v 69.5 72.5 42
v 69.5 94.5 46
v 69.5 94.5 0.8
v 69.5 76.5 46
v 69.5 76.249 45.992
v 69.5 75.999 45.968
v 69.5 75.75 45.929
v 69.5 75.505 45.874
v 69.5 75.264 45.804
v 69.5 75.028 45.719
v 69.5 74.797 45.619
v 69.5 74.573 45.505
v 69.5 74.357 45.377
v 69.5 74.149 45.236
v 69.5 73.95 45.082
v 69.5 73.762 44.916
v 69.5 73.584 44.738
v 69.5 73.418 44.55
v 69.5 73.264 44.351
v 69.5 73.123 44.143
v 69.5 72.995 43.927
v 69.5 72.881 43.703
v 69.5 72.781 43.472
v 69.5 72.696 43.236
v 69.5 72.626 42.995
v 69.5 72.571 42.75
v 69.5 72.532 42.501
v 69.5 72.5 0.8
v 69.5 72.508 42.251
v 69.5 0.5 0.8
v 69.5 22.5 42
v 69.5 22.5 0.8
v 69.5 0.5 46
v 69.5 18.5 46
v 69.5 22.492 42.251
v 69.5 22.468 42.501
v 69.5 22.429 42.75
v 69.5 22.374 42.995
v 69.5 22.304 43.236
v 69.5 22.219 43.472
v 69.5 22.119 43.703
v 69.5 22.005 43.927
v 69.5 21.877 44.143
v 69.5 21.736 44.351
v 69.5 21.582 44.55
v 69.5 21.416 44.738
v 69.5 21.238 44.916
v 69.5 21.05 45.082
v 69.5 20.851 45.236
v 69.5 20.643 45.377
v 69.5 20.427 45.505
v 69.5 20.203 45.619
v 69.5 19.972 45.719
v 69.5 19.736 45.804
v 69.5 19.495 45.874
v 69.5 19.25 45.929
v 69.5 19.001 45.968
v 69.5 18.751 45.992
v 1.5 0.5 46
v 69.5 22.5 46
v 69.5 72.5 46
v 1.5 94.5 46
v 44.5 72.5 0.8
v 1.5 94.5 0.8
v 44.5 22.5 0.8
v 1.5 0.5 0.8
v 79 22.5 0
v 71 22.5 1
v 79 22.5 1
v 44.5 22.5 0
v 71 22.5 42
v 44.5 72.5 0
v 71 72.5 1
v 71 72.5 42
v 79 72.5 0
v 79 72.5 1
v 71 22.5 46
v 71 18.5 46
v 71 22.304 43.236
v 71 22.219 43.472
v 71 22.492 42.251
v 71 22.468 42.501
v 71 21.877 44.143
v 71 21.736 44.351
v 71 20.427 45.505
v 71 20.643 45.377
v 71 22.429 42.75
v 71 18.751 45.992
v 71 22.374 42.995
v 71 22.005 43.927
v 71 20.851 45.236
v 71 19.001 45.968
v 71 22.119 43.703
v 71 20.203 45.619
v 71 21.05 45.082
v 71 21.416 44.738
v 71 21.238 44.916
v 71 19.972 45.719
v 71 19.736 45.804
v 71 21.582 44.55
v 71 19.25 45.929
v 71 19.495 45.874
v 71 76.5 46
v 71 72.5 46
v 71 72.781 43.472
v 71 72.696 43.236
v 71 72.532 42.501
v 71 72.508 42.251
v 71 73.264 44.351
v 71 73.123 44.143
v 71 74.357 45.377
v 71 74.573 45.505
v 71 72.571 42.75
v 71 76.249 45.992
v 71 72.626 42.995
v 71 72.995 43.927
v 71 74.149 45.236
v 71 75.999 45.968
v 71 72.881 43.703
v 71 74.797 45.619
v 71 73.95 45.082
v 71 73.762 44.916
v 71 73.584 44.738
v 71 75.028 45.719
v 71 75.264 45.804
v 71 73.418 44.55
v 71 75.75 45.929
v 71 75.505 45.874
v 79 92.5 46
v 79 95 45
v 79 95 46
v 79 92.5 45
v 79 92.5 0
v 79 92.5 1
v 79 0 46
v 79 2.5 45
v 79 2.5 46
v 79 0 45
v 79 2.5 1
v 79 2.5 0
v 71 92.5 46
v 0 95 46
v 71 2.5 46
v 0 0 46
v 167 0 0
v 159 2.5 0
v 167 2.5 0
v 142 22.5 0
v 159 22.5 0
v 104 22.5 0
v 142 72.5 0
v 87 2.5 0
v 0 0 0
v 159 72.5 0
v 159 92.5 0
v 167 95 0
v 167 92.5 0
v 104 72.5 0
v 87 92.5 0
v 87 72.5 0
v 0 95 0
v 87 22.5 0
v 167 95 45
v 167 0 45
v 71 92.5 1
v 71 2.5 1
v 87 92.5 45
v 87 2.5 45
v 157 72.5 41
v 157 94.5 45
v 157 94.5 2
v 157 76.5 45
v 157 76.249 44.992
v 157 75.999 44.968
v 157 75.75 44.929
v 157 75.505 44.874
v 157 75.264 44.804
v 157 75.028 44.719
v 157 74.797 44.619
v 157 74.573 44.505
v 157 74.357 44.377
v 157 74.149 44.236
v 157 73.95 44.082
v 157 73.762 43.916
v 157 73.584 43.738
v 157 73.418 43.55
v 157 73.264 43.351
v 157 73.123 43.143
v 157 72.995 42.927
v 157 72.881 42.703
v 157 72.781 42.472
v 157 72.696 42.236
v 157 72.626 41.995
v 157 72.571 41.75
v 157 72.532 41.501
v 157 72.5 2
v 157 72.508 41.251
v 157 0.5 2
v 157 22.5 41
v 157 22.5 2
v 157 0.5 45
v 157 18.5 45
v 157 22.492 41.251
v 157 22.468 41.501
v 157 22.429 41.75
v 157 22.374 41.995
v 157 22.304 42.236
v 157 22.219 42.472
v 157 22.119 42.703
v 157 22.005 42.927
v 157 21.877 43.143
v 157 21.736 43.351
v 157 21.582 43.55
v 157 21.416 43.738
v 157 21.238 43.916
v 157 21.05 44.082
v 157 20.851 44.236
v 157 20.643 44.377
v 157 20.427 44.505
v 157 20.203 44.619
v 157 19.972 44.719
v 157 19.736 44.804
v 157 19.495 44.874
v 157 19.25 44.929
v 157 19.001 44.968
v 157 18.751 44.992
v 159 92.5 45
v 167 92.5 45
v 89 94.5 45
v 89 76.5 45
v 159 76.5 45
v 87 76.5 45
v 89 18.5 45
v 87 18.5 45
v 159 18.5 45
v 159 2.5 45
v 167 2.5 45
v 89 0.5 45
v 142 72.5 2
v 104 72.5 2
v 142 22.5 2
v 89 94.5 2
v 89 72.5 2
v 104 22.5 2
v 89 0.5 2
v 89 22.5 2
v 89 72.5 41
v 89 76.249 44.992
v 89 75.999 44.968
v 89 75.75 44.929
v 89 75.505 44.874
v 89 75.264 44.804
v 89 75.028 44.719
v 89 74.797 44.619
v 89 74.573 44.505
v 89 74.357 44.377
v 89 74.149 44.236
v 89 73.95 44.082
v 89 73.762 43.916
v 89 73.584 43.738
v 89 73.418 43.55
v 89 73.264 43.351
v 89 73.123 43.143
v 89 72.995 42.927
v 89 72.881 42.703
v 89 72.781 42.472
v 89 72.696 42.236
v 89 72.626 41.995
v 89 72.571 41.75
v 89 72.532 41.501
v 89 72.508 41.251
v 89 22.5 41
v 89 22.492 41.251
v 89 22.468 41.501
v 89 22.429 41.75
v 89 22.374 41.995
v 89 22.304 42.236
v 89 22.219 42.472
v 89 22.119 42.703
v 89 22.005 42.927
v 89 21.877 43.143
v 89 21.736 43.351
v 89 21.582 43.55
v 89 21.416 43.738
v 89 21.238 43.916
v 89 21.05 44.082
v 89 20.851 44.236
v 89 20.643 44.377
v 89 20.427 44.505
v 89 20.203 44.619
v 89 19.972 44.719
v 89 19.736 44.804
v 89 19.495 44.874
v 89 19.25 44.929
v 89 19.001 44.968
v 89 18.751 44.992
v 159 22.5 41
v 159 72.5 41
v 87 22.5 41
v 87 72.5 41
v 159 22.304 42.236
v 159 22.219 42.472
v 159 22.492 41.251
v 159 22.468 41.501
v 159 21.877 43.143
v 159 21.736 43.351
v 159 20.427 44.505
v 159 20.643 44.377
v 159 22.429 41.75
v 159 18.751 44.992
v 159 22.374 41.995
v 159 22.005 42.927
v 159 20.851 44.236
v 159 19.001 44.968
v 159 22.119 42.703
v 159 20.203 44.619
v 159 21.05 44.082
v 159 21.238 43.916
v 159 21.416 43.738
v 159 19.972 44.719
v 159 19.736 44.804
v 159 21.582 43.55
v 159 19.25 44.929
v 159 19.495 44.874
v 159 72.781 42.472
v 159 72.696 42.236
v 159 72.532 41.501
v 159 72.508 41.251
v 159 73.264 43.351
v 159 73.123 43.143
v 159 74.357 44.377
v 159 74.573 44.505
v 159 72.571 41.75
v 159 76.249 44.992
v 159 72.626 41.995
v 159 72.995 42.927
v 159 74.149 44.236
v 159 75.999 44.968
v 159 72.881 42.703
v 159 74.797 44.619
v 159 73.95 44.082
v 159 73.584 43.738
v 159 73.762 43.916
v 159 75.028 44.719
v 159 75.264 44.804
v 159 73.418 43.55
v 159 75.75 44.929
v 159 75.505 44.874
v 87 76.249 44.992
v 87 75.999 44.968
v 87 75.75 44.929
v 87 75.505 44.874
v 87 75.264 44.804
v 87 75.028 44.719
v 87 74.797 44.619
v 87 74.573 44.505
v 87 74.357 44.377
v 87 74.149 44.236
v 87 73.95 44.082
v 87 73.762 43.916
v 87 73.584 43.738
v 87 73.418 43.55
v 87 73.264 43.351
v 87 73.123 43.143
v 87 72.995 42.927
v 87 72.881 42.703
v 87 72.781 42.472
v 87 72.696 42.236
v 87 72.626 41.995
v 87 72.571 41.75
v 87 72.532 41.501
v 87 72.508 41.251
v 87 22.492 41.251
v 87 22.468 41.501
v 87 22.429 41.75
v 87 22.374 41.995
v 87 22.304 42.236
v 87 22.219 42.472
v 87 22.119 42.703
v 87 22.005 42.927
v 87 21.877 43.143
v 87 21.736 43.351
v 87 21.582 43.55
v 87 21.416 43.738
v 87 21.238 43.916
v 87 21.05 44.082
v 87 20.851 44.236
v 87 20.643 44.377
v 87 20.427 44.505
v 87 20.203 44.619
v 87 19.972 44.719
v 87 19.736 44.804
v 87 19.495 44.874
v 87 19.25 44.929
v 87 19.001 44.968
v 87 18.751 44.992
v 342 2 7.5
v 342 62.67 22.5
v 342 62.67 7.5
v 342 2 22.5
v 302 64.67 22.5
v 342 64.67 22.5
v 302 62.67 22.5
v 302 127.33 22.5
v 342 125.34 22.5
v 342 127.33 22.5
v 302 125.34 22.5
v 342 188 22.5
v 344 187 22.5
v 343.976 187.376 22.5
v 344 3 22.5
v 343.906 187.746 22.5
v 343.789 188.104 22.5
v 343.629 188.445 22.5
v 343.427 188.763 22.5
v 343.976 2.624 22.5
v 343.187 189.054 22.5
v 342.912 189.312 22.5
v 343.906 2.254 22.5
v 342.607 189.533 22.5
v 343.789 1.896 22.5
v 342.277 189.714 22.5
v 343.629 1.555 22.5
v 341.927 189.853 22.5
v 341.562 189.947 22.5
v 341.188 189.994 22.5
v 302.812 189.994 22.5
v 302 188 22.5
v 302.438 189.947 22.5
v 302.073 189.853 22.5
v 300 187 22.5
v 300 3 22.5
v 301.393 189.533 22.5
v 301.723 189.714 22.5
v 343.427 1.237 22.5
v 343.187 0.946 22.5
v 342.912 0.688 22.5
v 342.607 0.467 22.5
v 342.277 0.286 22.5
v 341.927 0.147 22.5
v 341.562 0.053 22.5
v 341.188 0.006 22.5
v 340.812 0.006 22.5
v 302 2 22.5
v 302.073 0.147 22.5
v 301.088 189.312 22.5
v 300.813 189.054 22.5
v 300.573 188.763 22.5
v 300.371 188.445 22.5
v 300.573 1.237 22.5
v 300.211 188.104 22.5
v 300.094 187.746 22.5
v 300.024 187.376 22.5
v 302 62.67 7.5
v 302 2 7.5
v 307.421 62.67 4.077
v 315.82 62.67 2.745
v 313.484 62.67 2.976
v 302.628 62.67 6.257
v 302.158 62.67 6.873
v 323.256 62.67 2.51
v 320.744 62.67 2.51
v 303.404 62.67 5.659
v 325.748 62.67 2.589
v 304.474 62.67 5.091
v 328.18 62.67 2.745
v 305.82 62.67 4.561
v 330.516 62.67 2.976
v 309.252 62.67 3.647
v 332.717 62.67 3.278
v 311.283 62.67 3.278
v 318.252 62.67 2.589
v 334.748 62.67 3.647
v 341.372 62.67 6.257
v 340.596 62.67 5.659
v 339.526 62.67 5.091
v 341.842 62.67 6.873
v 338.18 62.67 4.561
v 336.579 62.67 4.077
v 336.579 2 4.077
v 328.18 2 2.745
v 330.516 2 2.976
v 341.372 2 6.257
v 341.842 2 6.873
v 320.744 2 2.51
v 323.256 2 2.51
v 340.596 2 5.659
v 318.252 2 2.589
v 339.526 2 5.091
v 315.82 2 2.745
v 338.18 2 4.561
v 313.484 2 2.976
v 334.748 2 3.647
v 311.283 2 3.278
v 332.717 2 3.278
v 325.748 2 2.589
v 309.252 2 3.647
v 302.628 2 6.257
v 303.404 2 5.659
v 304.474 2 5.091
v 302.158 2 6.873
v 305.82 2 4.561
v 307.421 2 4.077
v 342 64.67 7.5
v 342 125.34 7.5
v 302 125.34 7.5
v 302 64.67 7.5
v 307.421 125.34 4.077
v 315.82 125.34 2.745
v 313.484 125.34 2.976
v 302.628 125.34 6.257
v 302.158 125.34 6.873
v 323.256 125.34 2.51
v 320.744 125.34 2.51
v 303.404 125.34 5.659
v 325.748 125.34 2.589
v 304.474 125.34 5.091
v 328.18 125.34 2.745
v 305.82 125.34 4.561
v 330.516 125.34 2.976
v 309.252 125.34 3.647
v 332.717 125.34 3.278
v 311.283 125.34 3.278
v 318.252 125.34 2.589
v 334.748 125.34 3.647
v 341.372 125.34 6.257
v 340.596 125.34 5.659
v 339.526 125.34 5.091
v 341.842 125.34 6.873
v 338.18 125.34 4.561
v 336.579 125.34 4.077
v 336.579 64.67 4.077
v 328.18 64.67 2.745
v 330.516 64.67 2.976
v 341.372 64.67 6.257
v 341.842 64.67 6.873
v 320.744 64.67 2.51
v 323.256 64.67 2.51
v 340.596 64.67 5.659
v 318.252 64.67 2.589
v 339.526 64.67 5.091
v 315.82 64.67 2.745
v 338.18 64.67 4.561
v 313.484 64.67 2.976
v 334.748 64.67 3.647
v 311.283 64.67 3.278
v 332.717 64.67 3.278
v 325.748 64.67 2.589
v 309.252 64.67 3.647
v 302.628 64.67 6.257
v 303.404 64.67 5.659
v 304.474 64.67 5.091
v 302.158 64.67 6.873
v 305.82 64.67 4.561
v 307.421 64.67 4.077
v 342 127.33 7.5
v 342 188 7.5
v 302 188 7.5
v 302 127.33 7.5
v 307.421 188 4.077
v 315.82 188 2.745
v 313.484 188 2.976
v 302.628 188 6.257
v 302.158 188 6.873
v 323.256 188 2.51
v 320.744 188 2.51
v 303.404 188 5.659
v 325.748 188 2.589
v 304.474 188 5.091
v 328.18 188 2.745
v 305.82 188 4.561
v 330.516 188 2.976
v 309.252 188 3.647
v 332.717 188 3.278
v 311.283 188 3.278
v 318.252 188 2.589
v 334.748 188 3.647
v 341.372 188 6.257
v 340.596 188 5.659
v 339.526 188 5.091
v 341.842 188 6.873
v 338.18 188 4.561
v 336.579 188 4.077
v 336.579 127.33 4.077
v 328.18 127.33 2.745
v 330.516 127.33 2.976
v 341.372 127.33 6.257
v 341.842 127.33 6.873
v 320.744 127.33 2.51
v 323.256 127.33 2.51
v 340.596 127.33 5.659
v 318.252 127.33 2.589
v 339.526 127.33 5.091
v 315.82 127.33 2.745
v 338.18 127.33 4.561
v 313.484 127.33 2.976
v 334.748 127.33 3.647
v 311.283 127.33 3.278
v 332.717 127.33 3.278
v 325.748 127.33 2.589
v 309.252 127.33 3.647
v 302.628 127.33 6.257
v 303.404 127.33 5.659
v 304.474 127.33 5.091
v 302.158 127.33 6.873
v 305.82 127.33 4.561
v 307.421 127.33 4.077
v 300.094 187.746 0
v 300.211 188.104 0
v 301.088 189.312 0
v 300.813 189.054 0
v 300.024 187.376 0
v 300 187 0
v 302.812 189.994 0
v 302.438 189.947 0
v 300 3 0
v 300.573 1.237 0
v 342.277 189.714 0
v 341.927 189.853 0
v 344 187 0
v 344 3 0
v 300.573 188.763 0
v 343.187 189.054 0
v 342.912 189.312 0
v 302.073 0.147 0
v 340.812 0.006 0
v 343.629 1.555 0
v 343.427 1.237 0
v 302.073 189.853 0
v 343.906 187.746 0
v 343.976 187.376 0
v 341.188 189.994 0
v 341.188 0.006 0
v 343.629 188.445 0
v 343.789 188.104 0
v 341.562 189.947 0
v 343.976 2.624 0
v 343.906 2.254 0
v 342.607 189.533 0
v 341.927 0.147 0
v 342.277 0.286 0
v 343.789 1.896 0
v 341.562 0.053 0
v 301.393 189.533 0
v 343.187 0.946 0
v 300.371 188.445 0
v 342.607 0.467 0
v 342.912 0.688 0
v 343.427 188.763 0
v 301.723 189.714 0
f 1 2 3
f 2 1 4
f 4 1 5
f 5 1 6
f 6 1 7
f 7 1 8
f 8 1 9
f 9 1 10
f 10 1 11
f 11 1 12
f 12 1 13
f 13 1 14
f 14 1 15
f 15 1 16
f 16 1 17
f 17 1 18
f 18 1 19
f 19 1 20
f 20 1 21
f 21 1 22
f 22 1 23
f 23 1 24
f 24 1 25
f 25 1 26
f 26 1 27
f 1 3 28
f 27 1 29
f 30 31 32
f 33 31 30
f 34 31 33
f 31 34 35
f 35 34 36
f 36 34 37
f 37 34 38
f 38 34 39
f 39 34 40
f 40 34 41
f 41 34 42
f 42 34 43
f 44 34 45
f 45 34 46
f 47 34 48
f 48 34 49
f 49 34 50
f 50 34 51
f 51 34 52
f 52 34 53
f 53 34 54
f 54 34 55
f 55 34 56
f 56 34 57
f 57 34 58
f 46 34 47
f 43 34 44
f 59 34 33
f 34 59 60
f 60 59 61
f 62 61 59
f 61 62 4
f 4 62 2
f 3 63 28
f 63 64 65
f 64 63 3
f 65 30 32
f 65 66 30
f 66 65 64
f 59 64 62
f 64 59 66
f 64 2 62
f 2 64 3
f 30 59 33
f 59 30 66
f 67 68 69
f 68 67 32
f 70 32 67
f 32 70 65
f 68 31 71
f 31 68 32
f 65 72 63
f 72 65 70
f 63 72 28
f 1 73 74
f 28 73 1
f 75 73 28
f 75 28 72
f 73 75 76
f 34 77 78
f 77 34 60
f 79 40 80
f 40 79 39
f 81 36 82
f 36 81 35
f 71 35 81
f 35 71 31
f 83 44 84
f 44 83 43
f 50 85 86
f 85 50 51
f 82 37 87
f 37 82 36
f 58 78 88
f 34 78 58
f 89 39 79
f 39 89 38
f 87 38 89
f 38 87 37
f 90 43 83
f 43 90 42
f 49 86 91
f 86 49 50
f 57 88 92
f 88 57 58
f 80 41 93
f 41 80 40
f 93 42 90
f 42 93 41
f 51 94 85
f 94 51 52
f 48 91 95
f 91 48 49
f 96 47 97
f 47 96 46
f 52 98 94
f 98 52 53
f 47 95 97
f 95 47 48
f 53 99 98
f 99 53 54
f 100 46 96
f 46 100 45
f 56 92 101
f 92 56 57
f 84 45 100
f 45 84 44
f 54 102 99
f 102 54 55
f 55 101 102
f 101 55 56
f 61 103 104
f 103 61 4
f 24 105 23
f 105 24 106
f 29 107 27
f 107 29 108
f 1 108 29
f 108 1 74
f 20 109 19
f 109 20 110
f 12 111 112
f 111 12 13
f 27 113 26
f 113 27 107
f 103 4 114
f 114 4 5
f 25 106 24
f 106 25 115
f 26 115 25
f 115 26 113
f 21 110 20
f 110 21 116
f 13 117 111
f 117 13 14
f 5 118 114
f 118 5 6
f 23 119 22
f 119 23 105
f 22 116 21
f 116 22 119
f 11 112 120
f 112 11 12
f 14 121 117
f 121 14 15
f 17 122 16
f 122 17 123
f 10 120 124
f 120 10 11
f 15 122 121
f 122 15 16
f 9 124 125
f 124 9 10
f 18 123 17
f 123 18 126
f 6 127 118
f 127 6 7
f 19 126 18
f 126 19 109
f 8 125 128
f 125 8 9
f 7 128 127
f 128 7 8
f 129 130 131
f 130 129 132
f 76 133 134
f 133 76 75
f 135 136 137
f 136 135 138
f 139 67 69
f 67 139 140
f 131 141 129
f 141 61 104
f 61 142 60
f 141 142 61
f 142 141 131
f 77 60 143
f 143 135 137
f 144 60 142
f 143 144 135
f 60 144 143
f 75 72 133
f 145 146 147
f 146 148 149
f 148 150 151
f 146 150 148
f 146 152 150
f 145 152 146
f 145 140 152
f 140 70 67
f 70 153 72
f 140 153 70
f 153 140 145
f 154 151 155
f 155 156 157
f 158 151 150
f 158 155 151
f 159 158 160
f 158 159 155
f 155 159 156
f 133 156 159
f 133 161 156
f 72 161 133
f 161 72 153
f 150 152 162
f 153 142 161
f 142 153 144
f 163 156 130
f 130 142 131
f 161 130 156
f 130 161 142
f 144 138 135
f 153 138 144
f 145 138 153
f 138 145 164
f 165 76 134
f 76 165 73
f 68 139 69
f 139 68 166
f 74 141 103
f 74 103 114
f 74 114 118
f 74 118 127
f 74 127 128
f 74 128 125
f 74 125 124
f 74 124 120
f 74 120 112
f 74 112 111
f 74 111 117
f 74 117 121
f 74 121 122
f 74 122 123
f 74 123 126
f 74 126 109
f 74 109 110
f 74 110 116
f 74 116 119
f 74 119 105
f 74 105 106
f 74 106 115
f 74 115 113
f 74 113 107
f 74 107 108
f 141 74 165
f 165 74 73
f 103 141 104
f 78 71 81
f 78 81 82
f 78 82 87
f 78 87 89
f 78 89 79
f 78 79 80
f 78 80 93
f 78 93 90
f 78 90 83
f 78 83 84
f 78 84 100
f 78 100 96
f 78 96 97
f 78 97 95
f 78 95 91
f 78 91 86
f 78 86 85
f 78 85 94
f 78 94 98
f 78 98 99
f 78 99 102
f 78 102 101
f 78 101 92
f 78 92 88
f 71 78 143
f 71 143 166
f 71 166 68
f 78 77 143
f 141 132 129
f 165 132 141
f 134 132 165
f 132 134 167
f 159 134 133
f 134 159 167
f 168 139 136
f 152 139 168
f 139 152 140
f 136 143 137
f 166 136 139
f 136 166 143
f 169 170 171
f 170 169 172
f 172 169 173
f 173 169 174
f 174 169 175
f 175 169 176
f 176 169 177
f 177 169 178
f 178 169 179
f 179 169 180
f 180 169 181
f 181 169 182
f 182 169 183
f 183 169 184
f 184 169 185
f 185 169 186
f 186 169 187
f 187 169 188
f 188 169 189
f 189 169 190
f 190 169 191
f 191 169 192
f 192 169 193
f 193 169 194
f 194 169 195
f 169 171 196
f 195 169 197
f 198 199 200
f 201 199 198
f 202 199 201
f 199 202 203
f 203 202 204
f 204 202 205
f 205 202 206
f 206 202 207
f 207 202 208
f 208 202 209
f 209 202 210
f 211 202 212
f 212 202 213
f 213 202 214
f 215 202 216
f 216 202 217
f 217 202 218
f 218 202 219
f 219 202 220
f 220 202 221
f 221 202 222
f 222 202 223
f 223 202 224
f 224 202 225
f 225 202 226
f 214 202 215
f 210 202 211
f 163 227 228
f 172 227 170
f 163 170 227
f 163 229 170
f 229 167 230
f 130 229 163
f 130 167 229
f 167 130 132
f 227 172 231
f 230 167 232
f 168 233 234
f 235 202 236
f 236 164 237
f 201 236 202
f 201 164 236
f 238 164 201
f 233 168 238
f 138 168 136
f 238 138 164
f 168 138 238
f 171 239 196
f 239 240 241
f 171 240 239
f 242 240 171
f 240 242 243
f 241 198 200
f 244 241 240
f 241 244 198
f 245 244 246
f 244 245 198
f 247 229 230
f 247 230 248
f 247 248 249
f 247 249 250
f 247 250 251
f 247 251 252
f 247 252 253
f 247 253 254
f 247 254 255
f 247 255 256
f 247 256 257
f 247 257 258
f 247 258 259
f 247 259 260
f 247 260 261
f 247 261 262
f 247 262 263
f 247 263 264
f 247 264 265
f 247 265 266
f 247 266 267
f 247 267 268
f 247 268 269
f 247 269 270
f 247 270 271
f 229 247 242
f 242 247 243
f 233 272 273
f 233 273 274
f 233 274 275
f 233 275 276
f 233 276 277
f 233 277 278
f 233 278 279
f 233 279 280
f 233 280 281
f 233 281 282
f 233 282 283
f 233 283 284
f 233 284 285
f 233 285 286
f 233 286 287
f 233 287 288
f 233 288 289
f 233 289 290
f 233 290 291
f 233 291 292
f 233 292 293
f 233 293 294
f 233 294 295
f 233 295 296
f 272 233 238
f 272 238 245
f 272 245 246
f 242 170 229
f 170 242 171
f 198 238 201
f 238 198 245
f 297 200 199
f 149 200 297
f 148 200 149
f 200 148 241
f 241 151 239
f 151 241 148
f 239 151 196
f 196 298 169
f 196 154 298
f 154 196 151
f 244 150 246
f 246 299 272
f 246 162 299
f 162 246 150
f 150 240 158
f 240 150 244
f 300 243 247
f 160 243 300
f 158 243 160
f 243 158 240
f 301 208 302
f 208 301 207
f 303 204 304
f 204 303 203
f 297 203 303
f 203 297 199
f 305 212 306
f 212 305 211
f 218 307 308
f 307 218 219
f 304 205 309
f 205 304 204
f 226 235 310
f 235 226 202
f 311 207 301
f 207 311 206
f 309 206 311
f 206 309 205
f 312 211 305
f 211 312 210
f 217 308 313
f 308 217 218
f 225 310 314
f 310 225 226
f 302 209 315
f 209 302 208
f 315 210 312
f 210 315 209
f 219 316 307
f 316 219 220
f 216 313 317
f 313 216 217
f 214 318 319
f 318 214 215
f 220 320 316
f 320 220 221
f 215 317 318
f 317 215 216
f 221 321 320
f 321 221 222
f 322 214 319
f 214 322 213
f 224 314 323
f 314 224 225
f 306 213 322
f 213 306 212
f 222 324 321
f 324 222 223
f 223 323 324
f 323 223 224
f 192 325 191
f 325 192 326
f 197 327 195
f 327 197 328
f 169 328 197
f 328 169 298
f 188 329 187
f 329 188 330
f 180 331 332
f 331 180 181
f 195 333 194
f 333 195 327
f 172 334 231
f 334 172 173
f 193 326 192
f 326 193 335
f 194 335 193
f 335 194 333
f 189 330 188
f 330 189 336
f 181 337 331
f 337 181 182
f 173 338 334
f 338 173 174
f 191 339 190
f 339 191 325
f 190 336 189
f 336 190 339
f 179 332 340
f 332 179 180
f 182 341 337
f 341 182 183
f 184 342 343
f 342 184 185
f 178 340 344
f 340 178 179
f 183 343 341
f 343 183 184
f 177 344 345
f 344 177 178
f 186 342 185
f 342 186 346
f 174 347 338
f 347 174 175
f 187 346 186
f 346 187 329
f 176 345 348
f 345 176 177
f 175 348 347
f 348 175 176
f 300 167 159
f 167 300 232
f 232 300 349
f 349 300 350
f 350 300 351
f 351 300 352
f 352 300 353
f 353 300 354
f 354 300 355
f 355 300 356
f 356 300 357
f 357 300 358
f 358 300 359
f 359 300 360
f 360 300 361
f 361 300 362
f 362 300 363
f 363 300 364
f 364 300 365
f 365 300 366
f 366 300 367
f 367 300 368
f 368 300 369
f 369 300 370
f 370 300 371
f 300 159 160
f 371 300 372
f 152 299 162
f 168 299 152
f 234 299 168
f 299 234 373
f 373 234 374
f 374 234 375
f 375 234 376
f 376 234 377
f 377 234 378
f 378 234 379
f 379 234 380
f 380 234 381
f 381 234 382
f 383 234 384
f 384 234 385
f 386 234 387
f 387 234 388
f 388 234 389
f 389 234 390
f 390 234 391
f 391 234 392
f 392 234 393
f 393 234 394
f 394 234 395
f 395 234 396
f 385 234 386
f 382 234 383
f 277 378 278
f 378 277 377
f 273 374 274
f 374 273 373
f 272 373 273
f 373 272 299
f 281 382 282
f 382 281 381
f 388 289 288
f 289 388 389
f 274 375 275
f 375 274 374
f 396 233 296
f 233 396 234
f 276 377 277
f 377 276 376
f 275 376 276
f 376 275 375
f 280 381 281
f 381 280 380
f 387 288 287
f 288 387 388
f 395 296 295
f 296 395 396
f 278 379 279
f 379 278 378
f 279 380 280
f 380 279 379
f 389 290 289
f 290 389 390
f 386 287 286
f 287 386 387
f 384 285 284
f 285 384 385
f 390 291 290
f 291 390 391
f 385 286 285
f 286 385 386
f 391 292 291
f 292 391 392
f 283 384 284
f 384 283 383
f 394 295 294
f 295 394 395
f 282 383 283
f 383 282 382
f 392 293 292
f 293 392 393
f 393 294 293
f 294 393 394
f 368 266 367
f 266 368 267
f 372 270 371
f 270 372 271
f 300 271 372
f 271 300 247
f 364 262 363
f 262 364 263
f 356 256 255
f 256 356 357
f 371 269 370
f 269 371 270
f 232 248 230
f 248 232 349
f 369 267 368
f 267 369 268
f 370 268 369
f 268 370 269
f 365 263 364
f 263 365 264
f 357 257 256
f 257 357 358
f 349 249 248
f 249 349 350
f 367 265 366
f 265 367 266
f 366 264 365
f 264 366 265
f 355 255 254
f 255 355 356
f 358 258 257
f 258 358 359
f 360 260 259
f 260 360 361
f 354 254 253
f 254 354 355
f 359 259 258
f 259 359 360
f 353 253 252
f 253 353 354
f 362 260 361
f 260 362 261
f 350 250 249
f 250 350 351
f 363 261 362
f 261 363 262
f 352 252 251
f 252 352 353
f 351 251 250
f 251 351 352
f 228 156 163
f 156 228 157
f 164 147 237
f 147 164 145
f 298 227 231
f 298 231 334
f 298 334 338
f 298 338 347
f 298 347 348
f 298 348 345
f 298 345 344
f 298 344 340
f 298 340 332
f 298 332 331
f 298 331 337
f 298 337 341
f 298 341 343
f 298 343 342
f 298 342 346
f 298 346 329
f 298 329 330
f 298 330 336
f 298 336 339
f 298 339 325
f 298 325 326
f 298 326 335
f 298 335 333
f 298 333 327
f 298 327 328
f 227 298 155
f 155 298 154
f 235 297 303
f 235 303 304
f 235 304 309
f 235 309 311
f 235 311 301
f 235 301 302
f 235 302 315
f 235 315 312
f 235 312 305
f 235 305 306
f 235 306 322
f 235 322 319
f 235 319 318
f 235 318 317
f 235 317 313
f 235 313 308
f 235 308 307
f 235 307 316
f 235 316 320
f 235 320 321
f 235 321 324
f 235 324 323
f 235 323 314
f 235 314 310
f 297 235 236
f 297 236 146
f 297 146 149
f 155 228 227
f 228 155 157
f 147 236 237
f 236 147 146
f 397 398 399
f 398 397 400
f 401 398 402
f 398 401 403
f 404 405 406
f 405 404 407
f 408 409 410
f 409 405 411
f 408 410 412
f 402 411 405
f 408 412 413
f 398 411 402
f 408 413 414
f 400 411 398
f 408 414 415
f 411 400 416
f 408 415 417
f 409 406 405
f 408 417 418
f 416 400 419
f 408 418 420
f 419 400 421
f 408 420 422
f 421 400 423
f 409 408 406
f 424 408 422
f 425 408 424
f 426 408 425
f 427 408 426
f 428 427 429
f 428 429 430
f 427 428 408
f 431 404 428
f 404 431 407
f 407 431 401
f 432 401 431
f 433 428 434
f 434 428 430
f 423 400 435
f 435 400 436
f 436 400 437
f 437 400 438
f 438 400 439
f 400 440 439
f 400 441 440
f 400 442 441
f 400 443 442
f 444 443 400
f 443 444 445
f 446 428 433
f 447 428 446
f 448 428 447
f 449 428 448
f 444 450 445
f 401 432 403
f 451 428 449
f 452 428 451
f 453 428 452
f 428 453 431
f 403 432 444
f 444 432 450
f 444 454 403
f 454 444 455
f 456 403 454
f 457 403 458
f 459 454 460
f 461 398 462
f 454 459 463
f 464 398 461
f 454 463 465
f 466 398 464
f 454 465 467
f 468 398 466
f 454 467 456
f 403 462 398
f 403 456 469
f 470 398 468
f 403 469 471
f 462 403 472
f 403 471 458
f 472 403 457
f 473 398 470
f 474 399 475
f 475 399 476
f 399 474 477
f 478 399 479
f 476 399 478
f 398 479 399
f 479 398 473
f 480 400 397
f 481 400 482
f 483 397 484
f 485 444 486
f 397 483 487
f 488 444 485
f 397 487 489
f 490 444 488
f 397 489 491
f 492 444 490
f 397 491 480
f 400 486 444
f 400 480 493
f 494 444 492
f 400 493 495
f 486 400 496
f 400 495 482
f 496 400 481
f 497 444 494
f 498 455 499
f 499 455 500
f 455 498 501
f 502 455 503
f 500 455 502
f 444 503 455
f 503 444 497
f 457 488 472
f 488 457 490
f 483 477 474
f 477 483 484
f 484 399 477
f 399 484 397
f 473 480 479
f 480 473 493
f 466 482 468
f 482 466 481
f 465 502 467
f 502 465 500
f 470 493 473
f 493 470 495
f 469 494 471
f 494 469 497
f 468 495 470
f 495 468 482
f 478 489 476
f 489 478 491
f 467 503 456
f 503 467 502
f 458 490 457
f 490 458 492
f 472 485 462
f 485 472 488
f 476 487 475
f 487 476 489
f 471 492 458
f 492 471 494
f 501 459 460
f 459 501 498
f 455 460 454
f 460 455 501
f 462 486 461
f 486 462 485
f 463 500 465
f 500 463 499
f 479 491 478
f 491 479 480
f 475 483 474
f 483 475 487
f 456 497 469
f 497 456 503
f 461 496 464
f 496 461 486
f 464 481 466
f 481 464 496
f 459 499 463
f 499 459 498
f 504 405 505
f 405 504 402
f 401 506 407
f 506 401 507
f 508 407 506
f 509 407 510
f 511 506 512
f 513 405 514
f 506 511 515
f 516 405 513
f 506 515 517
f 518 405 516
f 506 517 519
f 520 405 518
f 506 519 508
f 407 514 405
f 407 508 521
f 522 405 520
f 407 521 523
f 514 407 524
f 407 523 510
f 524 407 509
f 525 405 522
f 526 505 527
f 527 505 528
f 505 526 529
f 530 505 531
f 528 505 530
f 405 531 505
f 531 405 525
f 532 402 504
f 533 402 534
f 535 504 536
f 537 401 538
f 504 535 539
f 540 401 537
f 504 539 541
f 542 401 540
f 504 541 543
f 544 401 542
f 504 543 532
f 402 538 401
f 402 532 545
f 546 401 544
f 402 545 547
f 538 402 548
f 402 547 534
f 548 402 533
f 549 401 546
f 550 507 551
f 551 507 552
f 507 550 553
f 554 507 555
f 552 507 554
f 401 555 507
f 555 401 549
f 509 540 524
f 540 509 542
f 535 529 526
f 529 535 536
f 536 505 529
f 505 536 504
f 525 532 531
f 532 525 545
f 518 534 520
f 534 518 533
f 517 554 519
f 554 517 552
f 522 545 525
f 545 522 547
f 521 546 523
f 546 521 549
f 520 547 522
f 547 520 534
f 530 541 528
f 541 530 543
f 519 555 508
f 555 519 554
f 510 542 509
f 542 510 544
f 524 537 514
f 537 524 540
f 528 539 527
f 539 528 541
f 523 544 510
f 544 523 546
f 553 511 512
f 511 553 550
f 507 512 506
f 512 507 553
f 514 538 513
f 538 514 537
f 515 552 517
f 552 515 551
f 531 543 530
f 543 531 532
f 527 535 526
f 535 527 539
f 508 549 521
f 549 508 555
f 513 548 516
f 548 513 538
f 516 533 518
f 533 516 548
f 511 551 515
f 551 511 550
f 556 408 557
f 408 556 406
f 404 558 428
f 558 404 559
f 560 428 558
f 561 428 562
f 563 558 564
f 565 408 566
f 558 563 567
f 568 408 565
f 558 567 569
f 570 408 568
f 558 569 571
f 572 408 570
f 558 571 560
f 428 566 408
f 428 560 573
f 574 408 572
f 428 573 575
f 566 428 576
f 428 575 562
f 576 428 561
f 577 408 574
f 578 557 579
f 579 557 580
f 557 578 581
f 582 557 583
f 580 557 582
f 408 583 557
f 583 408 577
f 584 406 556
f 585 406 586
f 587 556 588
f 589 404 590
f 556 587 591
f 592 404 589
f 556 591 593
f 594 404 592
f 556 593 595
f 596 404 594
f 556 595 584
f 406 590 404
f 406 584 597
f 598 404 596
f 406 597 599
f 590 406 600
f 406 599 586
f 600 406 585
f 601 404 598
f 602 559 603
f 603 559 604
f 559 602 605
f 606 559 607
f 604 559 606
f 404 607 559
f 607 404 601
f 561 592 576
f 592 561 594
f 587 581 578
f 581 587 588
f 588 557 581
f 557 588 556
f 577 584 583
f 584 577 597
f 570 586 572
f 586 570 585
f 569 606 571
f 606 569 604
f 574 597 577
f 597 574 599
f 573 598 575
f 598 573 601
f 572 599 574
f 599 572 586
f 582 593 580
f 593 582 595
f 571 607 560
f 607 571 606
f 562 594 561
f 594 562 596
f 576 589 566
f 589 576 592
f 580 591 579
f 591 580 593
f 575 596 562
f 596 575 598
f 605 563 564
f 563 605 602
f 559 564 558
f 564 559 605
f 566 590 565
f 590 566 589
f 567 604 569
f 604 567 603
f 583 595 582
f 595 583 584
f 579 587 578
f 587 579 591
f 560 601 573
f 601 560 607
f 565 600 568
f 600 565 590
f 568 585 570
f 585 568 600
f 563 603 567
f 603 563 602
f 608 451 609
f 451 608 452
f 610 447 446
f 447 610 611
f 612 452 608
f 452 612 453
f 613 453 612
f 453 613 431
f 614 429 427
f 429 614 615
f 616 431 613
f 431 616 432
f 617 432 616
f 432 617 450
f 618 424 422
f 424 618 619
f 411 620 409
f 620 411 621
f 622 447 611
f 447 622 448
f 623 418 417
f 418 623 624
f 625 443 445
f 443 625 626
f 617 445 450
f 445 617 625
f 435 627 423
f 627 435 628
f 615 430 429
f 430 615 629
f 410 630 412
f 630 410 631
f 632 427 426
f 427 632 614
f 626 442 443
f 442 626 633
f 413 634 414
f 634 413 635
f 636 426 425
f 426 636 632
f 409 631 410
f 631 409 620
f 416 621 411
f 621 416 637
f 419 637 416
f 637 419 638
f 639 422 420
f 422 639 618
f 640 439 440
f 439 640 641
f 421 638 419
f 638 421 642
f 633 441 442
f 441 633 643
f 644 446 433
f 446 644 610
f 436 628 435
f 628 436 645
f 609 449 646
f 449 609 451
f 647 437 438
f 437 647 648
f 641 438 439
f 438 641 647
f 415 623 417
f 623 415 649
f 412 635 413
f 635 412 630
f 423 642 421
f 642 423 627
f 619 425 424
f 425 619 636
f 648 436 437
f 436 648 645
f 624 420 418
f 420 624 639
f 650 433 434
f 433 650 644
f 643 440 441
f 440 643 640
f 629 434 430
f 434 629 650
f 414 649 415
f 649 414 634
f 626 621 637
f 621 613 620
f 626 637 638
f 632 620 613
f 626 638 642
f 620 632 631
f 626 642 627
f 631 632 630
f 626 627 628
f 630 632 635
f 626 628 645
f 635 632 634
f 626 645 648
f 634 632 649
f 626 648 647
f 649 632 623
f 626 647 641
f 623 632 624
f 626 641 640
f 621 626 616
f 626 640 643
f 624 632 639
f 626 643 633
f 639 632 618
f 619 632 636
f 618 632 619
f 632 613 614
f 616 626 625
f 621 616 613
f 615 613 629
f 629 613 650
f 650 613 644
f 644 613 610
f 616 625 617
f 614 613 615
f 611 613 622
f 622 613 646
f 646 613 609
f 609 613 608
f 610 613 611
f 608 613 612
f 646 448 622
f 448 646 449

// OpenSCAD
// file: Test-2.scad
/*Code Generated using OSCADSharp on 30/05/2025 09:12:49. 

For more information, please visit https://github.com/Exolun/OSCADSharp */

module Render2()
{
    difference()
    {
        translate(v = [3.00, 3.00, 0.00])
        {
            hull()
            {
                cylinder(center = false, r1 = 3, r2 = 3, h = 22.5);
                translate(v = [38.00, 0.00, 0.00])
                {
                    cylinder(center = false, r1 = 3, r2 = 3, h = 22.5, $fn = 50);
                }
                translate(v = [0.00, 184.00, 0.00])
                {
                    cylinder(center = false, r1 = 3, r2 = 3, h = 22.5, $fn = 50);
                }
                translate(v = [38.00, 184.00, 0.00])
                {
                    cylinder(center = false, r1 = 3, r2 = 3, h = 22.5, $fn = 50);
                }
            }
        }
        translate(v = [2.00, 2.00, 2.50])
        {
            union()
            {
                union()
                {
                    translate(v = [0.00, 0.00, 5.00])
                    {
                        cube(size = [40.00, 60.67, 15.00], center = false); 
                    }
                    translate(v = [20.00, 0.00, 5.00])
                    {
                        scale(v = [20.00, 60.67, 5.00])
                        {
                            rotate([-90.00, 0.00, 0.00])
                            {
                                cylinder(center = false, r1 = 1, r2 = 1, h = 1, $fn = 50);
                            }
                        }
                    }
                }
                translate(v = [0.00, 62.67, 0.00])
                {
                    union()
                    {
                        translate(v = [0.00, 0.00, 5.00])
                        {
                            cube(size = [40.00, 60.67, 15.00], center = false); 
                        }
                        translate(v = [20.00, 0.00, 5.00])
                        {
                            scale(v = [20.00, 60.67, 5.00])
                            {
                                rotate([-90.00, 0.00, 0.00])
                                {
                                    cylinder(center = false, r1 = 1, r2 = 1, h = 1, $fn = 50);
                                }
                            }
                        }
                    }
                }
                translate(v = [0.00, 125.33, 0.00])
                {
                    union()
                    {
                        translate(v = [0.00, 0.00, 5.00])
                        {
                            cube(size = [40.00, 60.67, 15.00], center = false); 
                        }
                        translate(v = [20.00, 0.00, 5.00])
                        {
                            scale(v = [20.00, 60.67, 5.00])
                            {
                                rotate([-90.00, 0.00, 0.00])
                                {
                                    cylinder(center = false, r1 = 1, r2 = 1, h = 1, $fn = 50);
                                }
                            }
                        }
                    }
                }
            }
        }
    }
}
// file: Test-1.scad
/*Code Generated using OSCADSharp on 30/05/2025 09:12:49. 

For more information, please visit https://github.com/Exolun/OSCADSharp */

module Render1()
{
    difference()
    {
        cube(size = [88.00, 95.00, 45.00], center = false); 
        translate(v = [10.00, 0.50, 2.00])
        {
            union()
            {
                union()
                {
                    union()
                    {
                        union()
                        {
                            cube(size = [68.00, 94.00, 43.00], center = false); 
                            translate(v = [83.00, 22.00, -10.00])
                            {
                                rotate([0.00, 0.00, 90.00])
                                {
                                    cube(size = [50.00, 30.00, 53.00], center = false); 
                                }
                            }
                        }
                        translate(v = [15.00, 22.00, -10.00])
                        {
                            rotate([0.00, 0.00, 90.00])
                            {
                                cube(size = [50.00, 30.00, 53.00], center = false); 
                            }
                        }
                    }
                    translate(v = [70.00, 18.00, 0.00])
                    {
                        rotate([0.00, 0.00, 90.00])
                        {
                            translate(v = [29.00, 0.00, 25.00])
                            {
                                union()
                                {
                                    hull()
                                    {
                                        rotate([90.00, 0.00, 0.00])
                                        {
                                            cylinder(center = true, r1 = 25, r2 = 25, h = 4);
                                        }
                                        translate(v = [-25.00, -2.00, 0.00])
                                        {
                                            cube(size = [50.00, 4.00, 18.00], center = false); 
                                        }
                                    }
                                    translate(v = [-29.00, -2.00, 14.00])
                                    {
                                        difference()
                                        {
                                            cube(size = [4.00, 4.00, 4.00], center = false); 
                                            translate(v = [0.00, 4.00, 0.00])
                                            {
                                                rotate([90.00, 0.00, 0.00])
                                                {
                                                    cylinder(center = false, r1 = 4, r2 = 4, h = 4, $fn = 100);
                                                }
                                            }
                                        }
                                    }
                                    mirror([50.00, 0.00, 0.00])
                                    {
                                        translate(v = [-29.00, -2.00, 14.00])
                                        {
                                            difference()
                                            {
                                                cube(size = [4.00, 4.00, 4.00], center = false); 
                                                translate(v = [0.00, 4.00, 0.00])
                                                {
                                                    rotate([90.00, 0.00, 0.00])
                                                    {
                                                        cylinder(center = false, r1 = 4, r2 = 4, h = 4, $fn = 100);
                                                    }
                                                }
                                            }
                                        }
                                    }
                                }
                            }
                        }
                    }
                }
                translate(v = [0.00, 18.00, 0.00])
                {
                    rotate([0.00, 0.00, 90.00])
                    {
                        translate(v = [29.00, 0.00, 25.00])
                        {
                            union()
                            {
                                hull()
                                {
                                    rotate([90.00, 0.00, 0.00])
                                    {
                                        cylinder(center = true, r1 = 25, r2 = 25, h = 4);
                                    }
                                    translate(v = [-25.00, -2.00, 0.00])
                                    {
                                        cube(size = [50.00, 4.00, 18.00], center = false); 
                                    }
                                }
                                translate(v = [-29.00, -2.00, 14.00])
                                {
                                    difference()
                                    {
                                        cube(size = [4.00, 4.00, 4.00], center = false); 
                                        translate(v = [0.00, 4.00, 0.00])
                                        {
                                            rotate([90.00, 0.00, 0.00])
                                            {
                                                cylinder(center = false, r1 = 4, r2 = 4, h = 4, $fn = 100);
                                            }
                                        }
                                    }
                                }
                                mirror([50.00, 0.00, 0.00])
                                {
                                    translate(v = [-29.00, -2.00, 14.00])
                                    {
                                        difference()
                                        {
                                            cube(size = [4.00, 4.00, 4.00], center = false); 
                                            translate(v = [0.00, 4.00, 0.00])
                                            {
                                                rotate([90.00, 0.00, 0.00])
                                                {
                                                    cylinder(center = false, r1 = 4, r2 = 4, h = 4, $fn = 100);
                                                }
                                            }
                                        }
                                    }
                                }
                            }
                        }
                    }
                }
            }
        }
        translate(v = [80.00, 2.50, 0.00])
        {
            cube(size = [8.00, 90.00, 45.00], center = false); 
        }
        translate(v = [0.00, 2.50, 0.00])
        {
            cube(size = [8.00, 90.00, 45.00], center = false); 
        }
    }
}
// file: Test-0.scad
/*Code Generated using OSCADSharp on 30/05/2025 09:12:49. 

For more information, please visit https://github.com/Exolun/OSCADSharp */

module Render0()
{
    difference()
    {
        cube(size = [79.00, 95.00, 46.00], center = false); 
        translate(v = [1.50, 0.50, 0.80])
        {
            union()
            {
                union()
                {
                    cube(size = [68.00, 94.00, 45.20], center = false); 
                    translate(v = [93.00, 22.00, -10.00])
                    {
                        rotate([0.00, 0.00, 90.00])
                        {
                            cube(size = [50.00, 50.00, 55.20], center = false); 
                        }
                    }
                }
                translate(v = [70.00, 18.00, 0.00])
                {
                    rotate([0.00, 0.00, 90.00])
                    {
                        translate(v = [29.00, 0.00, 25.00])
                        {
                            union()
                            {
                                hull()
                                {
                                    rotate([90.00, 0.00, 0.00])
                                    {
                                        cylinder(center = true, r1 = 25, r2 = 25, h = 4);
                                    }
                                    translate(v = [-25.00, -2.00, 0.00])
                                    {
                                        cube(size = [50.00, 4.00, 20.20], center = false); 
                                    }
                                }
                                translate(v = [-29.00, -2.00, 16.20])
                                {
                                    difference()
                                    {
                                        cube(size = [4.00, 4.00, 4.00], center = false); 
                                        translate(v = [0.00, 4.00, 0.00])
                                        {
                                            rotate([90.00, 0.00, 0.00])
                                            {
                                                cylinder(center = false, r1 = 4, r2 = 4, h = 4, $fn = 100);
                                            }
                                        }
                                    }
                                }
                                mirror([50.00, 0.00, 0.00])
                                {
                                    translate(v = [-29.00, -2.00, 16.20])
                                    {
                                        difference()
                                        {
                                            cube(size = [4.00, 4.00, 4.00], center = false); 
                                            translate(v = [0.00, 4.00, 0.00])
                                            {
                                                rotate([90.00, 0.00, 0.00])
                                                {
                                                    cylinder(center = false, r1 = 4, r2 = 4, h = 4, $fn = 100);
                                                }
                                            }
                                        }
                                    }
                                }
                            }
                        }
                    }
                }
            }
        }
        translate(v = [71.00, 2.50, 1.00])
        {
            cube(size = [8.00, 90.00, 45.00], center = false); 
        }
    }
}
// main file
/*Code Generated using OSCADSharp on 30/05/2025 09:12:49. 

For more information, please visit https://github.com/Exolun/OSCADSharp */

include <Test-0.scad>
include <Test-1.scad>
include <Test-2.scad>

translate([0,0,0])
Render0();

translate([79,0,0])
Render1();

translate([300,0,0])
Render2();
